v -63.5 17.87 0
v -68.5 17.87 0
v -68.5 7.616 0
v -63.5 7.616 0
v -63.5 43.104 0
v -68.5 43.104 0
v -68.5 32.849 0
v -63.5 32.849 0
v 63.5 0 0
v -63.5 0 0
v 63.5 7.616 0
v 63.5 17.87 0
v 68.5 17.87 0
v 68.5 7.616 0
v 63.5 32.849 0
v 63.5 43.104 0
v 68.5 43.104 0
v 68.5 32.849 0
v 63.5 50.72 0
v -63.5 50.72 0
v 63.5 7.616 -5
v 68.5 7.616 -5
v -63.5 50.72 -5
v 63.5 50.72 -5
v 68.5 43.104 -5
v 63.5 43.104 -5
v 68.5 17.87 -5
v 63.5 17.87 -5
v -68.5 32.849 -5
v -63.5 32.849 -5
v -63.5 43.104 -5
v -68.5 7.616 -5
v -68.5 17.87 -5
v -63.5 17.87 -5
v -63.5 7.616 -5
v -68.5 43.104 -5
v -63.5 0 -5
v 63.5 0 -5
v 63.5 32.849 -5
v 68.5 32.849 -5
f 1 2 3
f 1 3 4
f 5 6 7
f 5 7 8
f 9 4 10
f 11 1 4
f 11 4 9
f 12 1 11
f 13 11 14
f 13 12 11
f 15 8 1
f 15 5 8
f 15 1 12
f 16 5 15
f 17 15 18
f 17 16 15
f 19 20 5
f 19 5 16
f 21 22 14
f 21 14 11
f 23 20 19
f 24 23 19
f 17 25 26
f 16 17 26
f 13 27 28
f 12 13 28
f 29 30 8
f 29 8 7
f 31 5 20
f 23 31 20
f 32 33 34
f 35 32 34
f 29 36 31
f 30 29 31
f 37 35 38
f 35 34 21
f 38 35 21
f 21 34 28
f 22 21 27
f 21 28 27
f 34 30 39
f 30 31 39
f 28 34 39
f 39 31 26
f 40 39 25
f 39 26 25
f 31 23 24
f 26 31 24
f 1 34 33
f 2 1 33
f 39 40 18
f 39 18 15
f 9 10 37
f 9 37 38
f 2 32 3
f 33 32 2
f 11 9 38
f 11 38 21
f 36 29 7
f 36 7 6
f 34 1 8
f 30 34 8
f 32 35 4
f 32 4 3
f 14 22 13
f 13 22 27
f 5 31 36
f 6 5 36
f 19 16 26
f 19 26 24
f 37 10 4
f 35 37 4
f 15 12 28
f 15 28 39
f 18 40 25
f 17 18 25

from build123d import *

# Parameters (mm, degrees)
SKETCH1_W           = 127
SKETCH1_H           = 50.719999906
BOSS_EXTRUDE1_DEPTH = 5
SKETCH2_W           = 5
SKETCH2_H           = 10.254787301
BOSS_EXTRUDE2_DEPTH = 5


with BuildPart() as part:
    # Sketch1 → Boss-Extrude1 (new body)
    with BuildSketch(Plane.XY):
        with Locations((0, 25.359999953)):
            Rectangle(SKETCH1_W, SKETCH1_H)
    extrude(amount=-BOSS_EXTRUDE1_DEPTH)

    # Sketch2 → Boss-Extrude2 (add)
    with BuildSketch(Plane(origin=(0, 0, -5), x_dir=(-1, 0, 0), z_dir=(0, 0, -1))):
        with Locations((-66, 12.743106261)):
            Rectangle(SKETCH2_W, SKETCH2_H)
        with Locations((-66, 37.976893645)):
            Rectangle(SKETCH2_W, SKETCH2_H)
        with Locations((66, 12.743106261)):
            Rectangle(SKETCH2_W, SKETCH2_H)
        with Locations((66, 37.976893645)):
            Rectangle(SKETCH2_W, SKETCH2_H)
    extrude(amount=-BOSS_EXTRUDE2_DEPTH)


solid = part.part
